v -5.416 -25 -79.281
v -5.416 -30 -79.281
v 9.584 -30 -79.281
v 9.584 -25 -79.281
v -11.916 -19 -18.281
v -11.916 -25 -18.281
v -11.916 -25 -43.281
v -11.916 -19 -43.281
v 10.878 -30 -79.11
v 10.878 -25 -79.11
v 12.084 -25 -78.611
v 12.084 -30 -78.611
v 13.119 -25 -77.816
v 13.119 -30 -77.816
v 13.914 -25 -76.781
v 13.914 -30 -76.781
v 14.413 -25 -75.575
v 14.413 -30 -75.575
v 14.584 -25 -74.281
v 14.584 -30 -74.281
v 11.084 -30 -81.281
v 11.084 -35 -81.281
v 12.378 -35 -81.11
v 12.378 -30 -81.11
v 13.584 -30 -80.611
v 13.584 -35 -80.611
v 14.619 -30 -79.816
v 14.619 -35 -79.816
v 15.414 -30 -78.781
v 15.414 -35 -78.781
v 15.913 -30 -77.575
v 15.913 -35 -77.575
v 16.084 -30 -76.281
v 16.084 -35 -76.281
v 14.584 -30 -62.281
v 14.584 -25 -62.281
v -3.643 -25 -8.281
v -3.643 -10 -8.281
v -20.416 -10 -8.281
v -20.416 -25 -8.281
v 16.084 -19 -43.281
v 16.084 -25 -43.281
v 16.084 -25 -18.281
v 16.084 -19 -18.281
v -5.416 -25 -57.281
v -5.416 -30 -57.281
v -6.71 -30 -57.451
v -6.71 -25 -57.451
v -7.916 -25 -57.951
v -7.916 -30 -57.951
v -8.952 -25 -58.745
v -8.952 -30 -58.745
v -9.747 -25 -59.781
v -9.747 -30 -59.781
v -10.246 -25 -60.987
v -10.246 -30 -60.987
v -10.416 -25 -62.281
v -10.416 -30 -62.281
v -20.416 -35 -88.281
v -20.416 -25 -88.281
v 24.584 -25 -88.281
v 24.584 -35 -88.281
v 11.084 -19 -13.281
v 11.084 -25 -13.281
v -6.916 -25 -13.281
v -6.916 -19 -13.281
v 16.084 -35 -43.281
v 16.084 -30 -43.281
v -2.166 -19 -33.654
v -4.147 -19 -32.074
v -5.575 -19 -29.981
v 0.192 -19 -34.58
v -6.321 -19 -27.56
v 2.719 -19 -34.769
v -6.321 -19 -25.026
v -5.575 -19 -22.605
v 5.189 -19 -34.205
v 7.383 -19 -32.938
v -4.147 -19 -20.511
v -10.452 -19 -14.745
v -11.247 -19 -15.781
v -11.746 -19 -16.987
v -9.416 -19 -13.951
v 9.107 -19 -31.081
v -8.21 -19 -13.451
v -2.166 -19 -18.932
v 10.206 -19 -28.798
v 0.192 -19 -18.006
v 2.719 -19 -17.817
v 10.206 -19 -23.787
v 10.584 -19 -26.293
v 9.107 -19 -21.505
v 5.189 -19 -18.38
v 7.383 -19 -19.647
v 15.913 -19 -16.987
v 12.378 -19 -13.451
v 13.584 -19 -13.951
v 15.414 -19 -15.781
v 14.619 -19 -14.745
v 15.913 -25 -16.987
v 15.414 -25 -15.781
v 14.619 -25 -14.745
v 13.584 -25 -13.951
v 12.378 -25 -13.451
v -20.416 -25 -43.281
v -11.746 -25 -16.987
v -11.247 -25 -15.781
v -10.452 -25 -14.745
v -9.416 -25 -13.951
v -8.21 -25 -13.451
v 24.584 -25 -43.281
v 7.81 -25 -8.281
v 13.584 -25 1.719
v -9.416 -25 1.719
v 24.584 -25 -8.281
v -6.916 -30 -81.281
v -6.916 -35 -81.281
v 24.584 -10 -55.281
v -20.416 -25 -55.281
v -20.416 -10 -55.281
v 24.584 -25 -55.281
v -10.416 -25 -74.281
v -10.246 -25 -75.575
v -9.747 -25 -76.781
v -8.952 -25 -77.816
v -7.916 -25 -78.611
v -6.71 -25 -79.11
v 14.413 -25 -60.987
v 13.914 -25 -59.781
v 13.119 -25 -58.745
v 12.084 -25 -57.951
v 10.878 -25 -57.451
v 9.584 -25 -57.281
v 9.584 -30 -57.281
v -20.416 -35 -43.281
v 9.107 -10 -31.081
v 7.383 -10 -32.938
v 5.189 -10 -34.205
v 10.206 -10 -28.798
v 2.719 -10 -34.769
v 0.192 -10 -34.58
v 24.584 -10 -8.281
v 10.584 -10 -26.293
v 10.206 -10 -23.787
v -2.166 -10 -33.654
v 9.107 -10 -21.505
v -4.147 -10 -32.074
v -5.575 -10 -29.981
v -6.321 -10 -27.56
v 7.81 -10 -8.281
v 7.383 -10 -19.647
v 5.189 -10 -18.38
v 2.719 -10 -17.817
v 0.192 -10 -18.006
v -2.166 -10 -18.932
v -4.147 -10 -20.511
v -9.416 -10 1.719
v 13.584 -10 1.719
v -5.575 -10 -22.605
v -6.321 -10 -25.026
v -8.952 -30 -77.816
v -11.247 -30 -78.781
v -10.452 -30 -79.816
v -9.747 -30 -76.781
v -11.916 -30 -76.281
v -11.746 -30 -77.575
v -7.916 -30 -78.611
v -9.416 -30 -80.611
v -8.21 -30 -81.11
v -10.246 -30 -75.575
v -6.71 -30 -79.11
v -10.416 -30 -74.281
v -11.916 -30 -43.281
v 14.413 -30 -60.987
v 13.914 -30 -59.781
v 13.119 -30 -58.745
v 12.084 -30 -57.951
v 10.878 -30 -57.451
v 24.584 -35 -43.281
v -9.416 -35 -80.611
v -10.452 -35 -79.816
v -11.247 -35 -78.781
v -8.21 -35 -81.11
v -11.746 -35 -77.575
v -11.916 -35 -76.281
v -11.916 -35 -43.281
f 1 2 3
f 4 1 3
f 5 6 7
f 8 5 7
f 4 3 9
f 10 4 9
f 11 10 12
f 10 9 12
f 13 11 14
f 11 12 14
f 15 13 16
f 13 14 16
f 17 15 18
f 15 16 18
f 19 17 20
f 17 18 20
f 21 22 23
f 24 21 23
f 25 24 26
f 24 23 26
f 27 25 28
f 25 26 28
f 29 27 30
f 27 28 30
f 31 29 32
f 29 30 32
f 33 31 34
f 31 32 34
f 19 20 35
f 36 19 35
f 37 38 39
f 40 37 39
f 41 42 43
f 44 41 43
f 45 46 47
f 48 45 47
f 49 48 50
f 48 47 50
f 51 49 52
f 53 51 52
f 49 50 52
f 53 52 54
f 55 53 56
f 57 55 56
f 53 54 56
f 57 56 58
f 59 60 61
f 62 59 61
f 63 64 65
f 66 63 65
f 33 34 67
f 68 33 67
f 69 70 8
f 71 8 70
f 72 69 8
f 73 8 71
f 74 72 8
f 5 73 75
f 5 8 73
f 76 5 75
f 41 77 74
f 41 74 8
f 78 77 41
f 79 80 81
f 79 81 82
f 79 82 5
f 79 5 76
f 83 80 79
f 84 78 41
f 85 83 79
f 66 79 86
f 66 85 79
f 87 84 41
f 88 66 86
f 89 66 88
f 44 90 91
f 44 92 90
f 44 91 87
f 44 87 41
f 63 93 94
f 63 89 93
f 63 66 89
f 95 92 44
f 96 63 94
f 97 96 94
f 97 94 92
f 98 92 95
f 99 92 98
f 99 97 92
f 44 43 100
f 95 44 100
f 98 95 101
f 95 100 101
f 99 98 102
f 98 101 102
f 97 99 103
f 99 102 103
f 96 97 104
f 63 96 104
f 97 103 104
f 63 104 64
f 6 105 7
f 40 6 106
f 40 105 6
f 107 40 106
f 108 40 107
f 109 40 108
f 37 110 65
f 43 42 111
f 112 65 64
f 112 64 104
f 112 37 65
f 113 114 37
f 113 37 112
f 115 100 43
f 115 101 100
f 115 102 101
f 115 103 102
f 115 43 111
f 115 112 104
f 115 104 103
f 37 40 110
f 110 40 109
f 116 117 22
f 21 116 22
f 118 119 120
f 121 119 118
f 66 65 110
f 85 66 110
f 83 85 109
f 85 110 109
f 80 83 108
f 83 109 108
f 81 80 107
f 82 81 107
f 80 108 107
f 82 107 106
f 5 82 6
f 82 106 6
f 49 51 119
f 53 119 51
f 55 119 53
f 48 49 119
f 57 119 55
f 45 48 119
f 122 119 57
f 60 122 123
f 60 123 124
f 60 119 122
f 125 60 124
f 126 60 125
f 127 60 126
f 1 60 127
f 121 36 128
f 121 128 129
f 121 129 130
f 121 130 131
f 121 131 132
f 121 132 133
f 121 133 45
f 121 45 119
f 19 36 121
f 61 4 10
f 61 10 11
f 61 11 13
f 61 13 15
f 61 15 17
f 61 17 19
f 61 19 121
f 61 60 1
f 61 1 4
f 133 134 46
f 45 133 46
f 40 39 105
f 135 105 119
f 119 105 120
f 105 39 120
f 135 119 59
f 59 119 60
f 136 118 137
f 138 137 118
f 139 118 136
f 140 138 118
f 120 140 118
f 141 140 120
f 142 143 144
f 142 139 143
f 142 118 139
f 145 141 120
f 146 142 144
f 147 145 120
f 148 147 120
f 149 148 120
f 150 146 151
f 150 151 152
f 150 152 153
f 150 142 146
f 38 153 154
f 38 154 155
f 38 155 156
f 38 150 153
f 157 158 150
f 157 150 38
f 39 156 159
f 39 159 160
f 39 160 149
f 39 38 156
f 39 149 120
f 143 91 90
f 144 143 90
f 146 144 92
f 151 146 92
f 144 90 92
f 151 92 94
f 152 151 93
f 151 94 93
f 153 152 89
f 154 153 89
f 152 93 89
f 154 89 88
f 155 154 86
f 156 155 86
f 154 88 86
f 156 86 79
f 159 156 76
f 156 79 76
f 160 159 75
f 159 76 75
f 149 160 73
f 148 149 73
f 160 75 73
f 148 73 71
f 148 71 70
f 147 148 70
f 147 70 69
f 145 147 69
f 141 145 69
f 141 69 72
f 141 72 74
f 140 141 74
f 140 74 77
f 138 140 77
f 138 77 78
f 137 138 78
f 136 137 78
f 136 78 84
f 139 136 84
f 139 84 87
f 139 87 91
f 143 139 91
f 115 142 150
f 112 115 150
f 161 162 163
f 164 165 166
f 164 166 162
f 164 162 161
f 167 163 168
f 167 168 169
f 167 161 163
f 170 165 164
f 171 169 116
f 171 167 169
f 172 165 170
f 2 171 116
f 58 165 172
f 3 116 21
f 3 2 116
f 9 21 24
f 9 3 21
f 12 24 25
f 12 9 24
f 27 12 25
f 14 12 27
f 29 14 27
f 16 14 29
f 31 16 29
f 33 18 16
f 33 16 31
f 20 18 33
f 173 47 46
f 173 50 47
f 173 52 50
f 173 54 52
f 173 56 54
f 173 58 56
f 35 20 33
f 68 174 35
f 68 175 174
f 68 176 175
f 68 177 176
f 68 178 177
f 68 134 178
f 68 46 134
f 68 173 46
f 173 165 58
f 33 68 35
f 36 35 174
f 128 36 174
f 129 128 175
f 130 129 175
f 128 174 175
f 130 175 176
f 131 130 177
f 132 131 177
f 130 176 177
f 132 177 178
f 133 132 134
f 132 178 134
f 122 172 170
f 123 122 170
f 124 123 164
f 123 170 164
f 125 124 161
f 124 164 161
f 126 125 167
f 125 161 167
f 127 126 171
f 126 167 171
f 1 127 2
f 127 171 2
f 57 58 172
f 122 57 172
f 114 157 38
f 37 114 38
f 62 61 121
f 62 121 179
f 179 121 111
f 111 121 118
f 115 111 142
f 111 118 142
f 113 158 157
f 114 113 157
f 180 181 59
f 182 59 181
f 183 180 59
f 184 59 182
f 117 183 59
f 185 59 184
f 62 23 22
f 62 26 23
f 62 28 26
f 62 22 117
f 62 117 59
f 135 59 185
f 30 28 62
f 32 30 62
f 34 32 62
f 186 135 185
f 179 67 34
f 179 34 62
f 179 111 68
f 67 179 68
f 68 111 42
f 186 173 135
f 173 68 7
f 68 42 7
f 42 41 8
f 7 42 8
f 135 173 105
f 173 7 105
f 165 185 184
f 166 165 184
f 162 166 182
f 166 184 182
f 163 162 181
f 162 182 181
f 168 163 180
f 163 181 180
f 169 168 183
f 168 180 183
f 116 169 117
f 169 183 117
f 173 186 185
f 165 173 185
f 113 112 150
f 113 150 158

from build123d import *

# Parameters (mm, degrees)
F1_DEPTH  = 25
F2_R      = 8.5
F3_DEPTH  = 25
F5_DEPTH  = 6
F6_W      = 28
F6_H      = 15
F7_DEPTH  = 6
F8_W      = 45
F8_H      = 30
F9_DEPTH  = 10
F11_DEPTH = 5
F13_W     = 45
F13_H     = 25
F14_DEPTH = 3
F15_DEPTH = 25
F16_W     = 45
F16_H     = 47
F17_DEPTH = 10
F19_DEPTH = 10


with BuildPart() as f1:
    # F0 (on Front) → F1 (new body)
    with BuildSketch(Plane.XZ):
        Polygon((13.583599414, 1.7193433519), (-9.416400586, 1.7193433519), (-3.6428978941, -8.2806566481), (-20.416400586, -8.2806566481), (-20.416400586, -58.2806566481), (24.583599414, -58.2806566481), (24.583599414, -8.2806566481), (7.8100967221, -8.2806566481), align=None)
    extrude(amount=F1_DEPTH)

    # F2 (on face) → F3 (cut)
    with BuildSketch(Plane.XZ.offset(25)):
        with Locations((2.083599414, -26.2928102165)):
            Circle(F2_R)
    extrude(amount=-F3_DEPTH, mode=Mode.SUBTRACT)

    # F4 (on face) → F5 (cut)
    with BuildSketch(Plane.XZ.offset(25)):
        with BuildLine():
            Line((11.083599414, -13.2806566481), (-6.916400586, -13.2806566481))
            ThreePointArc((-6.916400586, -13.2806566481), (-10.4519344919, -14.7451227421), (-11.916400586, -18.2806566481))
            Line((-11.916400586, -18.2806566481), (-11.916400586, -58.2806566481))
            Line((-11.916400586, -58.2806566481), (16.083599414, -58.2806566481))
            Line((16.083599414, -58.2806566481), (16.083599414, -18.2806566481))
            ThreePointArc((16.083599414, -18.2806566481), (14.6191333199, -14.7451227421), (11.083599414, -13.2806566481))
        make_face()
    extrude(amount=-F5_DEPTH, mode=Mode.SUBTRACT)

    # F6 (on face) → F7 (join)
    with BuildSketch(Plane.XZ.offset(19)):
        with Locations((2.083599414, -50.7806566481)):
            Rectangle(F6_W, F6_H)
    extrude(amount=F7_DEPTH)

    # F8 (on face) → F9 (join)
    with BuildSketch(Plane.XZ.offset(25)):
        Polygon((-11.916400586, -43.2806566481), (-20.416400586, -43.2806566481), (-20.416400586, -58.2806566481), (24.583599414, -58.2806566481), (24.583599414, -43.2806566481), (16.083599414, -43.2806566481), align=None)
        with Locations((2.083599414, -73.2806566481)):
            Rectangle(F8_W, F8_H)
    extrude(amount=F9_DEPTH)

    # F10 (on face) → F11 (cut)
    with BuildSketch(Plane.XZ.offset(35)):
        with BuildLine():
            Line((16.083599414, -43.2806566481), (-11.916400586, -43.2806566481))
            Line((-11.916400586, -43.2806566481), (-11.916400586, -76.2806566481))
            ThreePointArc((-11.916400586, -76.2806566481), (-10.4519344919, -79.816190554), (-6.916400586, -81.2806566481))
            Line((-6.916400586, -81.2806566481), (11.083599414, -81.2806566481))
            ThreePointArc((11.083599414, -81.2806566481), (14.6191333199, -79.816190554), (16.083599414, -76.2806566481))
            Line((16.083599414, -76.2806566481), (16.083599414, -43.2806566481))
        make_face()
    extrude(amount=-F11_DEPTH, mode=Mode.SUBTRACT)

    # F13 (on face) → F14 (cut)
    with BuildSketch(Plane(origin=(0, 0, -58.2806566481), x_dir=(1, 0, 0), z_dir=(0, 0, -1))):
        with Locations((2.083599414, 12.5)):
            Rectangle(F13_W, F13_H)
    extrude(amount=-F14_DEPTH, mode=Mode.SUBTRACT)

    # F12 (on face) → F15 (cut)
    with BuildSketch(Plane.XZ.offset(30)):
        with BuildLine():
            ThreePointArc((14.583599414, -62.2806566481), (13.1191333199, -58.7451227421), (9.583599414, -57.2806566481))
            Line((9.583599414, -57.2806566481), (-5.416400586, -57.2806566481))
            ThreePointArc((-5.416400586, -57.2806566481), (-8.9519344919, -58.7451227421), (-10.416400586, -62.2806566481))
            Line((-10.416400586, -62.2806566481), (-10.416400586, -74.2806566481))
            ThreePointArc((-10.416400586, -74.2806566481), (-8.9519344919, -77.816190554), (-5.416400586, -79.2806566481))
            Line((-5.416400586, -79.2806566481), (9.583599414, -79.2806566481))
            ThreePointArc((9.583599414, -79.2806566481), (13.1191333199, -77.816190554), (14.583599414, -74.2806566481))
            Line((14.583599414, -74.2806566481), (14.583599414, -62.2806566481))
        make_face()
    extrude(amount=-F15_DEPTH, mode=Mode.SUBTRACT)

    # F16 (on face) → F17 (cut)
    with BuildSketch(Plane(origin=(0, 0, 0), x_dir=(-1, 0, 0), z_dir=(0, 1, 0))):
        with Locations((-2.083599414, -31.7806566481)):
            Rectangle(F16_W, F16_H)
    extrude(amount=-F17_DEPTH, mode=Mode.SUBTRACT)

    # F18 (on face) → F19 (cut)
    with BuildSketch(Plane(origin=(0, 0, 0), x_dir=(-1, 0, 0), z_dir=(0, 1, 0))):
        Polygon((9.416400586, 1.7193433519), (-13.583599414, 1.7193433519), (-7.8100967221, -8.2806566481), (3.6428978941, -8.2806566481), align=None)
    extrude(amount=-F19_DEPTH, mode=Mode.SUBTRACT)


solid = f1.part
